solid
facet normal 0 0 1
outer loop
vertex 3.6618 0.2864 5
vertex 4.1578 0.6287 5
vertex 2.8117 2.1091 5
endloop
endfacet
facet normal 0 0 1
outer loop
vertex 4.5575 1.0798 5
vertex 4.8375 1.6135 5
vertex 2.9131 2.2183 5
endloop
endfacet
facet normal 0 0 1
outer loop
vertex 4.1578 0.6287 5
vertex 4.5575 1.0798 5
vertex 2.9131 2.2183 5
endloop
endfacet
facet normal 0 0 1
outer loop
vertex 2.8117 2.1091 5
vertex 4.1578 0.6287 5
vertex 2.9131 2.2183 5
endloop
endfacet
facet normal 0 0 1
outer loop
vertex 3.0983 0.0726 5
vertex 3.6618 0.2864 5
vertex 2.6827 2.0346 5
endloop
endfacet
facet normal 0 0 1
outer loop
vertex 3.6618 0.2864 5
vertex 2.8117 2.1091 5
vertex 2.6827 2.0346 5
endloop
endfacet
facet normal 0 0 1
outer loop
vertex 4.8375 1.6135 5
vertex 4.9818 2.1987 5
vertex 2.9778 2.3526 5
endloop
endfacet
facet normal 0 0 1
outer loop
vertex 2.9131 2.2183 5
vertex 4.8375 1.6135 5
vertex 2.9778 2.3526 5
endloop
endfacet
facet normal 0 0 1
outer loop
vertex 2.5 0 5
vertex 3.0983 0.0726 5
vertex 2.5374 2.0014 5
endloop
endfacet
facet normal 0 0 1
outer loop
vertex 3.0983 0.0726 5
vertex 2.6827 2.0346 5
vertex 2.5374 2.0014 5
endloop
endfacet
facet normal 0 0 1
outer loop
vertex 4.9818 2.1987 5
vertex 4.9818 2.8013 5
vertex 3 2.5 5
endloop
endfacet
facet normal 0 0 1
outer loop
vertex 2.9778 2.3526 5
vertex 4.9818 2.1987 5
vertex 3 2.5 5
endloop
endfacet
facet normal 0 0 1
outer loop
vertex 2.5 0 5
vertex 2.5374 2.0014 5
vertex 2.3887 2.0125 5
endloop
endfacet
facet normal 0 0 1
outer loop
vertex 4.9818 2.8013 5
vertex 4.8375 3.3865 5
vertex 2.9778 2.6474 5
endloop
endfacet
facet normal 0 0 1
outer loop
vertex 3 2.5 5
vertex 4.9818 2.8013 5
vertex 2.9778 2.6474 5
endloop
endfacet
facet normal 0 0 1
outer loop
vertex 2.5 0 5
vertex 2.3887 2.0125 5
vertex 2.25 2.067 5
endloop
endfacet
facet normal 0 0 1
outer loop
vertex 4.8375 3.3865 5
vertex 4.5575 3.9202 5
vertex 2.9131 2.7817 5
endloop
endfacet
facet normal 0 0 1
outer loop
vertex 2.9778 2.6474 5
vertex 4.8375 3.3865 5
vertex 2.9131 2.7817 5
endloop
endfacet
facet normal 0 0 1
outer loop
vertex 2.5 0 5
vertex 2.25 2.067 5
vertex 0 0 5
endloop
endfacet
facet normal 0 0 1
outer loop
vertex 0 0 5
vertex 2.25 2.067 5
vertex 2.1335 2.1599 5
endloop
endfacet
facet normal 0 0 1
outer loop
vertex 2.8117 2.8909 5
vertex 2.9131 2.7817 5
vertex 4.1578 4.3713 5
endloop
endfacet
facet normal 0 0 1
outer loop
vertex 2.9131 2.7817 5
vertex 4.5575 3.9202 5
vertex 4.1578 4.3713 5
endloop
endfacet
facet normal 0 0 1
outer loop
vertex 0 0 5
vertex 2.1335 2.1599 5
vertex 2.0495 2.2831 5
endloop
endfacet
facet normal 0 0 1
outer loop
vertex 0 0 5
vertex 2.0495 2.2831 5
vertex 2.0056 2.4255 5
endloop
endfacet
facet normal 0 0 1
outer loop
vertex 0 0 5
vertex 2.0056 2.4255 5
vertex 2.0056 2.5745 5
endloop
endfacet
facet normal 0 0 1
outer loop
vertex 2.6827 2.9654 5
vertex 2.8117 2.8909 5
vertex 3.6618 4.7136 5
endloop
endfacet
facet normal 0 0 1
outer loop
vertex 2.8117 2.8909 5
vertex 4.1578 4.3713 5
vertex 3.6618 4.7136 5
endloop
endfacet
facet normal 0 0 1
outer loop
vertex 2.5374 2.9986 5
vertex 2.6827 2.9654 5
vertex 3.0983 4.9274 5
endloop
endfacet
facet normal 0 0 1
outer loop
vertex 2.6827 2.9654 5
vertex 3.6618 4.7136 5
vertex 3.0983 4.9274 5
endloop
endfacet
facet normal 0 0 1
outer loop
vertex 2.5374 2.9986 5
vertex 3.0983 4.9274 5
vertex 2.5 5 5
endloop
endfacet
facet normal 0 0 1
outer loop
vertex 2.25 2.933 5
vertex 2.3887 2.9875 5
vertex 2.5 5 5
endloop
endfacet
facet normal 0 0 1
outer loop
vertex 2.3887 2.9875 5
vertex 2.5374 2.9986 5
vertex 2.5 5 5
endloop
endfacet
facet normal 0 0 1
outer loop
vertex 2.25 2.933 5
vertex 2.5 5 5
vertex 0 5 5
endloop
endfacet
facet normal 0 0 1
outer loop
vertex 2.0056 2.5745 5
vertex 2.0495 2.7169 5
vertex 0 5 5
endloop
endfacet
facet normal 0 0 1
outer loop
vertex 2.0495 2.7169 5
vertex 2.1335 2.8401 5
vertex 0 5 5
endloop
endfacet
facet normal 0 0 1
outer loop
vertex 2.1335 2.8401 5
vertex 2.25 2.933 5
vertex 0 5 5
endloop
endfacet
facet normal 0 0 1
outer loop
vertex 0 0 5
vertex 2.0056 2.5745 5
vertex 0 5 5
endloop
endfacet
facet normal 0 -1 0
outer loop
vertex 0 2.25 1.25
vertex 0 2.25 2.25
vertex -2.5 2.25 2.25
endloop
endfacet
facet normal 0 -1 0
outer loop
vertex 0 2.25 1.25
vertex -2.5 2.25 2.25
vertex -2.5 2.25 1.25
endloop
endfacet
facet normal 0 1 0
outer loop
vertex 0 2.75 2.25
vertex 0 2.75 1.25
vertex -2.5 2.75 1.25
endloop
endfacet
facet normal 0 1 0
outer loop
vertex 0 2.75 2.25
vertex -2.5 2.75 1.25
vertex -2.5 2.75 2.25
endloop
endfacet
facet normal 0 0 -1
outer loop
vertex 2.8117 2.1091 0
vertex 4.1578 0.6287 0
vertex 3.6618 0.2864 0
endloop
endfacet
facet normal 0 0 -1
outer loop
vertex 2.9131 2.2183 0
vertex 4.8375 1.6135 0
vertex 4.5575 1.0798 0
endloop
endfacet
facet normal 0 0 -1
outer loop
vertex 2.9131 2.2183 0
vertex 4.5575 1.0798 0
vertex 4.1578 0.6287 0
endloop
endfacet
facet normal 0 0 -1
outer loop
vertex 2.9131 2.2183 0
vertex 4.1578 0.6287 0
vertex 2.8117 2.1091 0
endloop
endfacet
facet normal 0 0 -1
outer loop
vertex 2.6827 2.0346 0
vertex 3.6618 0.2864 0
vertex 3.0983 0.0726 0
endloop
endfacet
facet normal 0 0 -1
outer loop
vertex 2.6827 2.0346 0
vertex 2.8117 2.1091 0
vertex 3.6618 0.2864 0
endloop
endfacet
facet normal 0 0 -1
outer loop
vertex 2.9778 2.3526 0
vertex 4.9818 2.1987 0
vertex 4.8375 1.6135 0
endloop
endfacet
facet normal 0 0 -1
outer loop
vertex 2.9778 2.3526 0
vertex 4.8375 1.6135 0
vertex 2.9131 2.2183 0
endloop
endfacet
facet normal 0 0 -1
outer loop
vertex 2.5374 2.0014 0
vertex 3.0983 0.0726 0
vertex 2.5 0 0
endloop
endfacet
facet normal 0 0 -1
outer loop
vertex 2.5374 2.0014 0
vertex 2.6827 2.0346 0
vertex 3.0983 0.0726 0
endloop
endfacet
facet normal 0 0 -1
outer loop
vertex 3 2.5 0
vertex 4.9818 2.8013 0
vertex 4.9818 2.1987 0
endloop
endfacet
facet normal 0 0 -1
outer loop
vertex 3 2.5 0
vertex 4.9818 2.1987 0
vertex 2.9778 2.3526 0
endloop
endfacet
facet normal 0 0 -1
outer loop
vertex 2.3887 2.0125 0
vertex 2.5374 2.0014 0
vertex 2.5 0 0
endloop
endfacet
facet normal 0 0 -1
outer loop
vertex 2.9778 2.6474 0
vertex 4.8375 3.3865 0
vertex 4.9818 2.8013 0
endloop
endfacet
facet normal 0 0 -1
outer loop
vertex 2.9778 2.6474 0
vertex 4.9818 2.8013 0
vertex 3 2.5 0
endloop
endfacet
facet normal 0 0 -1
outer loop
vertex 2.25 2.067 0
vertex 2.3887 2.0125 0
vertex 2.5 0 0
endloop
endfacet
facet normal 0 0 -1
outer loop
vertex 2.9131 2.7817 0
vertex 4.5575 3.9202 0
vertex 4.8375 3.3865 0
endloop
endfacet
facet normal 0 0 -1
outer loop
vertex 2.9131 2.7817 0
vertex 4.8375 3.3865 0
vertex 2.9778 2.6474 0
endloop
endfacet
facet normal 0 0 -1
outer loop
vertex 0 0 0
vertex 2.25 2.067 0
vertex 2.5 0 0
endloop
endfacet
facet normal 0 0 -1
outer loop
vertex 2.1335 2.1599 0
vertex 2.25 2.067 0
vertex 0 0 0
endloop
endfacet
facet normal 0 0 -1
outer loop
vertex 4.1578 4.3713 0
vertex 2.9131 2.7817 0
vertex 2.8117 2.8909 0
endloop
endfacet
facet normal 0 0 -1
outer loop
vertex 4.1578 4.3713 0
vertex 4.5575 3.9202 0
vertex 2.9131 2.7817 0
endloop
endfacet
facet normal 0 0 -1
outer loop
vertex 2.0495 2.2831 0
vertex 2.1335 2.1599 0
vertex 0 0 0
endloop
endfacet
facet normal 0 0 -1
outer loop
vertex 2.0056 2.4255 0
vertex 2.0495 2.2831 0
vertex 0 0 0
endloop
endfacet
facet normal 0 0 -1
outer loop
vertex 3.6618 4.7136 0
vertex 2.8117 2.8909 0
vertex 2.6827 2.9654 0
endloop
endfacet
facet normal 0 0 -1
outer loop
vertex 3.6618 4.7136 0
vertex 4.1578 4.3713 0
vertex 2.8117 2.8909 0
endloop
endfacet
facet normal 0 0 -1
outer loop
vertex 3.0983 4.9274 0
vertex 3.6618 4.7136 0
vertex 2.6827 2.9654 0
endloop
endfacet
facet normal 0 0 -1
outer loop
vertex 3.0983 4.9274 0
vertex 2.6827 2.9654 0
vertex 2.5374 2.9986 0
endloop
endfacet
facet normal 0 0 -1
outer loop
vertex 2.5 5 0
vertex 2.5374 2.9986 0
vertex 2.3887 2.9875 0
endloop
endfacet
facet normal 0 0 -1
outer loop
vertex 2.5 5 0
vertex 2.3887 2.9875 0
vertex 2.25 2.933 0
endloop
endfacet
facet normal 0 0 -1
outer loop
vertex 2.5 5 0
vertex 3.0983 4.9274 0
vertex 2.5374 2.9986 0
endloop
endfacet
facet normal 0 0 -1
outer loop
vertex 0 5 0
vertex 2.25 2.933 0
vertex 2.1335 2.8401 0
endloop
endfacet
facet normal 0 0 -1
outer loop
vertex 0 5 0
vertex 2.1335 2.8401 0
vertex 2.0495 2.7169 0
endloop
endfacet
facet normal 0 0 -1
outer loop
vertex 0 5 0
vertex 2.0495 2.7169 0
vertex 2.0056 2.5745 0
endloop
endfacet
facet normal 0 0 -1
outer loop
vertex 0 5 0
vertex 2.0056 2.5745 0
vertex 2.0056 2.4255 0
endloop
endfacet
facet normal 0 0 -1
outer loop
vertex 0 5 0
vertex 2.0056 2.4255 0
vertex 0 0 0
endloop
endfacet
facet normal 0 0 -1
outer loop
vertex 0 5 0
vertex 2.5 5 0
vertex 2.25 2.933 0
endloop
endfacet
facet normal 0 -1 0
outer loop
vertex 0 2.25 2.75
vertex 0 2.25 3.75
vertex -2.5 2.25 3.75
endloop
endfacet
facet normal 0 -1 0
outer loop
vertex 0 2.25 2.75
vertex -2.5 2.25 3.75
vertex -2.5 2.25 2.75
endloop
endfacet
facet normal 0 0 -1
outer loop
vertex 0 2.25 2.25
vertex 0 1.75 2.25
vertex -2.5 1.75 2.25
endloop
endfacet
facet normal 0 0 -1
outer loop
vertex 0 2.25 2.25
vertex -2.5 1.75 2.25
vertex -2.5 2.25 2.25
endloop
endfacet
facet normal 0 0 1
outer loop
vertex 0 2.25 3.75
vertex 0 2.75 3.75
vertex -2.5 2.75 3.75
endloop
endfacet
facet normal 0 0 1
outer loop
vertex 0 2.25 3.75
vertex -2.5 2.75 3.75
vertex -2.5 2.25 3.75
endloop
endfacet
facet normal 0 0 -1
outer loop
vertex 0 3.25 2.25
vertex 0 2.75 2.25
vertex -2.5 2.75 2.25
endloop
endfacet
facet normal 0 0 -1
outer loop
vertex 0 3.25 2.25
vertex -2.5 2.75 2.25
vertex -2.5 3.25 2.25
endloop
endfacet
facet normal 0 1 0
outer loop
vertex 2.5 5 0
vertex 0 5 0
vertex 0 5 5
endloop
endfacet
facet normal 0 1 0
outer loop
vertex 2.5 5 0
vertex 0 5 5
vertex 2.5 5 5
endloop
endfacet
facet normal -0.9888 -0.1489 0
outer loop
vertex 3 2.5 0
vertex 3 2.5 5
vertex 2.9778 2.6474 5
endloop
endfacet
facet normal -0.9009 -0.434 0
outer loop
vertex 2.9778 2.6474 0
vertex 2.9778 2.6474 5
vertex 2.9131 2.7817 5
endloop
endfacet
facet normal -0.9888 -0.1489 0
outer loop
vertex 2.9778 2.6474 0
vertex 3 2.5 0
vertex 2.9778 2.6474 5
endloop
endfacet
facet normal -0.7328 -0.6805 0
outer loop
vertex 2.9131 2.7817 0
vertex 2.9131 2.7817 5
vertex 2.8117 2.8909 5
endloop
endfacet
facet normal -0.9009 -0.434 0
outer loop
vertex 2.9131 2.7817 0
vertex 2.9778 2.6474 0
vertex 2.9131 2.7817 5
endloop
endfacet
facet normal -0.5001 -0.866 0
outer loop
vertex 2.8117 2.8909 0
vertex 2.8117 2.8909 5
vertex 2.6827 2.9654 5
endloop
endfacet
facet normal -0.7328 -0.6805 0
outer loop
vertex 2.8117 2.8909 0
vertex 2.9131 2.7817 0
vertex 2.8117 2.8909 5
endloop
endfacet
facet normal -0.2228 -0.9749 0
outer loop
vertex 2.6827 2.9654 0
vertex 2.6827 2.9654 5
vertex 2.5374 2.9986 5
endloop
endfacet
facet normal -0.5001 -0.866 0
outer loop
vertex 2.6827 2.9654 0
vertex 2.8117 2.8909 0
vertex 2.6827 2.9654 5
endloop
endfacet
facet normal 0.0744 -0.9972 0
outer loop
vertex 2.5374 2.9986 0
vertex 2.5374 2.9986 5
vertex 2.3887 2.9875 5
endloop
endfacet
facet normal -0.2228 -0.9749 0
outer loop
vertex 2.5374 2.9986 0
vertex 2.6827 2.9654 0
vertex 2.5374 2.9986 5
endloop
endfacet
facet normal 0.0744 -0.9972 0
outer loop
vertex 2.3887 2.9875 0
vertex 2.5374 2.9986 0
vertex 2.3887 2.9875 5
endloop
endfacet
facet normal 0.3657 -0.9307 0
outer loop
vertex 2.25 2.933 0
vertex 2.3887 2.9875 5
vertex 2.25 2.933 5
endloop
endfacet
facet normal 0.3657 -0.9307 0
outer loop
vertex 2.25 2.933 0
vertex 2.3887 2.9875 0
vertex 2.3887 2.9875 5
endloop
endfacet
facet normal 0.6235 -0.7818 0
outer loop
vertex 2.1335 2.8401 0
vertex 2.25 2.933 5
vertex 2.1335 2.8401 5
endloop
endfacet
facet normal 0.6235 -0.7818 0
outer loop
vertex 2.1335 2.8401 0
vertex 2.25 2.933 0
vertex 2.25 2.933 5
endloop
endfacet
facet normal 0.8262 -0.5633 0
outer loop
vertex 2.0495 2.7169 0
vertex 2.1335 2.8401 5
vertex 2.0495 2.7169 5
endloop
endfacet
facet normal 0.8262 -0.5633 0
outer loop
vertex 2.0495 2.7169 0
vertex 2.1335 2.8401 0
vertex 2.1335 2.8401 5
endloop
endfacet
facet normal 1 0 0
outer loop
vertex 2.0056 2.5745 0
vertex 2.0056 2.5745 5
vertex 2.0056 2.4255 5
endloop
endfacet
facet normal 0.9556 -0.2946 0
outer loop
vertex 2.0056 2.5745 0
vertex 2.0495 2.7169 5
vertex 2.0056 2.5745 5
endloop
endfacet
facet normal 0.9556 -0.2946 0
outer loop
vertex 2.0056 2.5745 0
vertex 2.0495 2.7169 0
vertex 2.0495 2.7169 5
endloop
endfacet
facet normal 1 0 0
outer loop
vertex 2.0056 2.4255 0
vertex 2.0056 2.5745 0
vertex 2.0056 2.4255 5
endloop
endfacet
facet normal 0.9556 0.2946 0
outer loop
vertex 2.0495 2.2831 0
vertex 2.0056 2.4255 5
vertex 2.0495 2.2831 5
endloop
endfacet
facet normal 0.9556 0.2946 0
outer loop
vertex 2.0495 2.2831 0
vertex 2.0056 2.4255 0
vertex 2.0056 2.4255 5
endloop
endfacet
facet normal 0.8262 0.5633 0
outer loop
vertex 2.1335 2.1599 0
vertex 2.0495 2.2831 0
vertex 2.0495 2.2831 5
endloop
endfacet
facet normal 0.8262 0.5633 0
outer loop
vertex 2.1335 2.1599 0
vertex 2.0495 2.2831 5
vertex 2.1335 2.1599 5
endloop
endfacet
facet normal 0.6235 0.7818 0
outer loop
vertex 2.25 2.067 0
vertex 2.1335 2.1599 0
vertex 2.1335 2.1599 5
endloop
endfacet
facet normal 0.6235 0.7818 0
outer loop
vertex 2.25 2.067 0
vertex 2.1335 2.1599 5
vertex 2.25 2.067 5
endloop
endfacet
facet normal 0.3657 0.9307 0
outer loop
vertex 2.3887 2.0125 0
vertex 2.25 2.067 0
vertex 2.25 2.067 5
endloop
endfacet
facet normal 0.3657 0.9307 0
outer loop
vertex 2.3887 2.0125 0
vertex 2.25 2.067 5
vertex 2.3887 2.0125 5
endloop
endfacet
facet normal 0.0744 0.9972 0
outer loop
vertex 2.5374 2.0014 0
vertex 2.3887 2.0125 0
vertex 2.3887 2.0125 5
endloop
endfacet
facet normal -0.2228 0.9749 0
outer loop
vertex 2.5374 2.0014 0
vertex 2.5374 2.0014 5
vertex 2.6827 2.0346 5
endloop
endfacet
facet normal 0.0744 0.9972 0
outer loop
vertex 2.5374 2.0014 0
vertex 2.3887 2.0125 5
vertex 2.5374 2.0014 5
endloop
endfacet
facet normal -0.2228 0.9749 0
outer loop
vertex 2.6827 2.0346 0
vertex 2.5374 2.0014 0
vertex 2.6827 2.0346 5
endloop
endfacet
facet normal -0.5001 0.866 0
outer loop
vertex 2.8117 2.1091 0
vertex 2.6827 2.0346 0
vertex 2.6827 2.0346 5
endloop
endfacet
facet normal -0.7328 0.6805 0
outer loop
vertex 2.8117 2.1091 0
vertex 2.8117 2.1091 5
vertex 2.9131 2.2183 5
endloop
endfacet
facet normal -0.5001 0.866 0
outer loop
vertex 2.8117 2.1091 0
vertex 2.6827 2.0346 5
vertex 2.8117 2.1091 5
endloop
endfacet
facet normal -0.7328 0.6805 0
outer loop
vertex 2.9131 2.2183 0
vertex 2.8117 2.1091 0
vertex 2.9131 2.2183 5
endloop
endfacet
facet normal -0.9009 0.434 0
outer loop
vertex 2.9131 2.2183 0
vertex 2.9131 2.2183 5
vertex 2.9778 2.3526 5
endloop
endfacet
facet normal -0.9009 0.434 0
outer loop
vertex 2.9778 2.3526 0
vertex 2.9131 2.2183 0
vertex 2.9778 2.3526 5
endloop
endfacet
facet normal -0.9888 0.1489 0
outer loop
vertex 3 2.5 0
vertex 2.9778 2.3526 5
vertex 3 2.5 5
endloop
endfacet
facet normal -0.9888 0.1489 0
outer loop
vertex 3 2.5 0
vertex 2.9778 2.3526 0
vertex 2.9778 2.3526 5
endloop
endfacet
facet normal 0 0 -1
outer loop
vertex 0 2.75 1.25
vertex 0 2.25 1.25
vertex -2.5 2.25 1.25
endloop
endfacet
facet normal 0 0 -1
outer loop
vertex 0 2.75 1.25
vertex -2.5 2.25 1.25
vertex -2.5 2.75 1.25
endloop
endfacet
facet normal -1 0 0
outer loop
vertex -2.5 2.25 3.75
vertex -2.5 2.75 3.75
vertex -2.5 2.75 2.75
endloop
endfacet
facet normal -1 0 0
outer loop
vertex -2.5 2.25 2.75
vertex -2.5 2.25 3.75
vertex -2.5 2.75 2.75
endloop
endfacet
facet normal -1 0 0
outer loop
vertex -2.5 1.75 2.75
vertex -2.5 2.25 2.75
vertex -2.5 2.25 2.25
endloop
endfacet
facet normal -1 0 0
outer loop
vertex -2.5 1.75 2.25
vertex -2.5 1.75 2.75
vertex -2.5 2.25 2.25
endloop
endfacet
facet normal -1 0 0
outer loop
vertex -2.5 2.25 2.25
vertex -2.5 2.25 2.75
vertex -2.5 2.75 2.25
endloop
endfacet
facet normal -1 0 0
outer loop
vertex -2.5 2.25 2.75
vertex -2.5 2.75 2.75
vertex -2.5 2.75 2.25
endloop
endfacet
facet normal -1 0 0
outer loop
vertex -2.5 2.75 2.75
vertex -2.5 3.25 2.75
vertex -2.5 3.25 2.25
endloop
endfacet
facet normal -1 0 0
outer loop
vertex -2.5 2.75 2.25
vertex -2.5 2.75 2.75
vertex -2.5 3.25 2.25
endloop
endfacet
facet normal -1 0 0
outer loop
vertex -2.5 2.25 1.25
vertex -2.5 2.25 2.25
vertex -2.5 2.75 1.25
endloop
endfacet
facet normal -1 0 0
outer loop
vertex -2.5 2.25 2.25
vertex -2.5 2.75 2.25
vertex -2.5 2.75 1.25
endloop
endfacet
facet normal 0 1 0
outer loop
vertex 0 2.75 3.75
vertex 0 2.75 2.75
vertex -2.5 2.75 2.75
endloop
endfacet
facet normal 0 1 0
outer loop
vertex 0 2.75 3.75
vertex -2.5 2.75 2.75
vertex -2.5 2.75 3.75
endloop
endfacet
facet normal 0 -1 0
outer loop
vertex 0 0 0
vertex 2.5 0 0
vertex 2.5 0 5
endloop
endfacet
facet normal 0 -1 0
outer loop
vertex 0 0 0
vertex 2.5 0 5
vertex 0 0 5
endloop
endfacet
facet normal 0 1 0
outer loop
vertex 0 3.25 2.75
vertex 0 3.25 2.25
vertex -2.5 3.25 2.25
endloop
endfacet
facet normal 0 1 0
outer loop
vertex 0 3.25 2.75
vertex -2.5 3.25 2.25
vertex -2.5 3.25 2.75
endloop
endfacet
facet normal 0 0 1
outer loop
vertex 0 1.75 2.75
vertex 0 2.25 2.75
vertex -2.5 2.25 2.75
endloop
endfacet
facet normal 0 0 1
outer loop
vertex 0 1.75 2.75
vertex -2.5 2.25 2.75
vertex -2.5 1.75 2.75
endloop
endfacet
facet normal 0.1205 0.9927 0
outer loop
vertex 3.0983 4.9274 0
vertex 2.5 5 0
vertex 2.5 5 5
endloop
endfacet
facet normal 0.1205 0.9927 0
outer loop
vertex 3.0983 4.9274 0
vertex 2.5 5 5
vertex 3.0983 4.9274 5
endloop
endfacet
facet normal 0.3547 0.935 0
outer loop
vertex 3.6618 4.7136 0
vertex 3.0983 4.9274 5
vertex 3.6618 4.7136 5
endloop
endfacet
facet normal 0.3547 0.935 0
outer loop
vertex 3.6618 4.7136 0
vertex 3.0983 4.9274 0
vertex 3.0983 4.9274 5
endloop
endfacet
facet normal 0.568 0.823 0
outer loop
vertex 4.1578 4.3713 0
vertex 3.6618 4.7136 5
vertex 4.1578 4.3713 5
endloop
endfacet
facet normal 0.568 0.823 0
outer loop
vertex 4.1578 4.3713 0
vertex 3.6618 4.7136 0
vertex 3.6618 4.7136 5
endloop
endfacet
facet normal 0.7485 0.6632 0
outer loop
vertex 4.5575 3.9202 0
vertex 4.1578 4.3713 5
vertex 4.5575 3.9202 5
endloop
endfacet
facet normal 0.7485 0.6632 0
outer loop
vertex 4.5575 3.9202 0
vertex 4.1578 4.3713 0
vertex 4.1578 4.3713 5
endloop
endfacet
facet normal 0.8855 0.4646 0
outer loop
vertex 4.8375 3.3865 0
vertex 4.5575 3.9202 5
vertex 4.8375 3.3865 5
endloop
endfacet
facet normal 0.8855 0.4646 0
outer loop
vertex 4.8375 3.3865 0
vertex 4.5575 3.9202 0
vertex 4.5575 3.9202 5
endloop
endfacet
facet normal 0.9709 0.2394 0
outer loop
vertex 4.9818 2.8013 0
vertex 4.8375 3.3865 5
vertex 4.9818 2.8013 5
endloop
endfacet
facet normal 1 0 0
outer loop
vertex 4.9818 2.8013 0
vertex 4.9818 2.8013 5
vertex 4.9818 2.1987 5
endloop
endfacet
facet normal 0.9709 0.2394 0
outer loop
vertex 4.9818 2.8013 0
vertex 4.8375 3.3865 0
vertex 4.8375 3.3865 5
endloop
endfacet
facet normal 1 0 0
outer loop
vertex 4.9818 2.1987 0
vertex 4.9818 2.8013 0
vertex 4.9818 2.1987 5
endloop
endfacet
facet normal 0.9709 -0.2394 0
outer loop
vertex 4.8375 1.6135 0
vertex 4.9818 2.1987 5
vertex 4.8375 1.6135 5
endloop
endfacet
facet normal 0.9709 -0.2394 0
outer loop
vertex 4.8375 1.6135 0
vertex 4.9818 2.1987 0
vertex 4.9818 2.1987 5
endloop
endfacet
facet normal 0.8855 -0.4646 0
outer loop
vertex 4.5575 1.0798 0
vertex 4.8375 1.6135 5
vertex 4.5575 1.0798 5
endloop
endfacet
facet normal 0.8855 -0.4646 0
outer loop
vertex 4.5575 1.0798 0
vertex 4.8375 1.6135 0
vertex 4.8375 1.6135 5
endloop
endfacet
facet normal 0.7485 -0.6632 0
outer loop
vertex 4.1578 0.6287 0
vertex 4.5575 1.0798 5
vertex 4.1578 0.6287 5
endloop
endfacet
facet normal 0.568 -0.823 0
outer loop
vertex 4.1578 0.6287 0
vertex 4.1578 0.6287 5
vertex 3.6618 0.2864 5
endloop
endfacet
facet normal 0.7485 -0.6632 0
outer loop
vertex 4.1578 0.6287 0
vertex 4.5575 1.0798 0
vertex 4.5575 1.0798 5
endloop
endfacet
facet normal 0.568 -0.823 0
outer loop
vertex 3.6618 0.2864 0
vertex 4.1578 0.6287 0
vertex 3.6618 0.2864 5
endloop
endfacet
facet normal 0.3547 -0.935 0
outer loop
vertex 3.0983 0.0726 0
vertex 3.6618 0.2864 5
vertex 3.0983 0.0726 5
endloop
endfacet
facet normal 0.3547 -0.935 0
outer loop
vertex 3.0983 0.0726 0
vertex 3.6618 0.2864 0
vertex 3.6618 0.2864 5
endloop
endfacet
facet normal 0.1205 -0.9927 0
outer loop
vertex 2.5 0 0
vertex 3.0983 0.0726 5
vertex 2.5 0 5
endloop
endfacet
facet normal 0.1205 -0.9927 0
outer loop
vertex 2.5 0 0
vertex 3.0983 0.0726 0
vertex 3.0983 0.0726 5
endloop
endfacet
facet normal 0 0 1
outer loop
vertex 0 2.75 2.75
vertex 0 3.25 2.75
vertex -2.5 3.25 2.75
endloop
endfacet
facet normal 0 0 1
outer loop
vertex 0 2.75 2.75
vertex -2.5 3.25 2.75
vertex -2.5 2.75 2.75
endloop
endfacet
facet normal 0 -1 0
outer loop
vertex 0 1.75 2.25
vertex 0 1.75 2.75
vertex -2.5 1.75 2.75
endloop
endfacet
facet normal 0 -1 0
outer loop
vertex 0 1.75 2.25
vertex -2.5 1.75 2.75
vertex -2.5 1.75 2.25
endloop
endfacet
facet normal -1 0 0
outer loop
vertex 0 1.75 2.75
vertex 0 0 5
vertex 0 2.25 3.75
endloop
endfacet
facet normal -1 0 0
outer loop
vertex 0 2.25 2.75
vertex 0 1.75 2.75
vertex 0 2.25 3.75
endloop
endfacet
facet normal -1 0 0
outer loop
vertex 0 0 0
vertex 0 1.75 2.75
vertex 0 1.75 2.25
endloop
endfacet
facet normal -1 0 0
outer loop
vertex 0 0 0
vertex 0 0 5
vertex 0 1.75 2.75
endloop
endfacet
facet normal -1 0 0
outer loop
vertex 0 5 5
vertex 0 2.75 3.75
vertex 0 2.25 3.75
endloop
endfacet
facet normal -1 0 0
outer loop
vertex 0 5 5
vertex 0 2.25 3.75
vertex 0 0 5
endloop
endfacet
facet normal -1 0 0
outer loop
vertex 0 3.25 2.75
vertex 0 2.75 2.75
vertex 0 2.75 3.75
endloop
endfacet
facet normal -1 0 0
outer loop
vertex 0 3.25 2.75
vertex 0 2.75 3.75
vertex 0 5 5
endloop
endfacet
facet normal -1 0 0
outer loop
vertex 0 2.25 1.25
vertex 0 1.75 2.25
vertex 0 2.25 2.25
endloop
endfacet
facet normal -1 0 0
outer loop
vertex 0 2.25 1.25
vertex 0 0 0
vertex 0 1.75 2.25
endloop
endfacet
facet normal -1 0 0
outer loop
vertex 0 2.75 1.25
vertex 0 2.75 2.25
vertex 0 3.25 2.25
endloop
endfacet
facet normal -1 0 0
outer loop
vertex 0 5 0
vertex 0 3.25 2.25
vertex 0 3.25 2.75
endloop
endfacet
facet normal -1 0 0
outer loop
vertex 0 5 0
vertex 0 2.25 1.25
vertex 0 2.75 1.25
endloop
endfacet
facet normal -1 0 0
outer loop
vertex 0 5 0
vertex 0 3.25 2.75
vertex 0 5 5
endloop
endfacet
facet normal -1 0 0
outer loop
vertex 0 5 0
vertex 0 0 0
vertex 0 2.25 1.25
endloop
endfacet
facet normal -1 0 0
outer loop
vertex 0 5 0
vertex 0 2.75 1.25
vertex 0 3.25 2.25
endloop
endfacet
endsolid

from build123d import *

# Parameters (mm, degrees)
BOSS_EXTRUDE1_DEPTH = 5
SKETCH2_R           = 0.5
CUT_EXTRUDE1_DEPTH  = 9.660254038
BOSS_EXTRUDE2_DEPTH = 2.5


with BuildPart() as part:
    # Sketch1 → Boss-Extrude1 (new body)
    with BuildSketch(Plane.XY):
        with BuildLine():
            Line((0, 5), (2.5, 5))
            ThreePointArc((2.5, 5), (5, 2.5), (2.5, 0))
            Line((2.5, 0), (0, 0))
            Line((0, 0), (0, 5))
        make_face()
    extrude(amount=BOSS_EXTRUDE1_DEPTH)

    # Sketch2 → Cut-Extrude1 (cut, through all)
    with BuildSketch(Plane.XY):
        with Locations((2.5, 2.5)):
            Circle(SKETCH2_R)
    extrude(amount=CUT_EXTRUDE1_DEPTH, mode=Mode.SUBTRACT)

    # Sketch4 → Boss-Extrude2 (add)
    with BuildSketch(Plane.ZY):
        Polygon((2.25, 2.75), (2.25, 3.25), (2.75, 3.25), (2.75, 2.75), (3.75, 2.75), (3.75, 2.25), (2.75, 2.25), (2.75, 1.75), (2.25, 1.75), (2.25, 2.25), (1.25, 2.25), (1.25, 2.75), align=None)
    extrude(amount=BOSS_EXTRUDE2_DEPTH)


solid = part.part
